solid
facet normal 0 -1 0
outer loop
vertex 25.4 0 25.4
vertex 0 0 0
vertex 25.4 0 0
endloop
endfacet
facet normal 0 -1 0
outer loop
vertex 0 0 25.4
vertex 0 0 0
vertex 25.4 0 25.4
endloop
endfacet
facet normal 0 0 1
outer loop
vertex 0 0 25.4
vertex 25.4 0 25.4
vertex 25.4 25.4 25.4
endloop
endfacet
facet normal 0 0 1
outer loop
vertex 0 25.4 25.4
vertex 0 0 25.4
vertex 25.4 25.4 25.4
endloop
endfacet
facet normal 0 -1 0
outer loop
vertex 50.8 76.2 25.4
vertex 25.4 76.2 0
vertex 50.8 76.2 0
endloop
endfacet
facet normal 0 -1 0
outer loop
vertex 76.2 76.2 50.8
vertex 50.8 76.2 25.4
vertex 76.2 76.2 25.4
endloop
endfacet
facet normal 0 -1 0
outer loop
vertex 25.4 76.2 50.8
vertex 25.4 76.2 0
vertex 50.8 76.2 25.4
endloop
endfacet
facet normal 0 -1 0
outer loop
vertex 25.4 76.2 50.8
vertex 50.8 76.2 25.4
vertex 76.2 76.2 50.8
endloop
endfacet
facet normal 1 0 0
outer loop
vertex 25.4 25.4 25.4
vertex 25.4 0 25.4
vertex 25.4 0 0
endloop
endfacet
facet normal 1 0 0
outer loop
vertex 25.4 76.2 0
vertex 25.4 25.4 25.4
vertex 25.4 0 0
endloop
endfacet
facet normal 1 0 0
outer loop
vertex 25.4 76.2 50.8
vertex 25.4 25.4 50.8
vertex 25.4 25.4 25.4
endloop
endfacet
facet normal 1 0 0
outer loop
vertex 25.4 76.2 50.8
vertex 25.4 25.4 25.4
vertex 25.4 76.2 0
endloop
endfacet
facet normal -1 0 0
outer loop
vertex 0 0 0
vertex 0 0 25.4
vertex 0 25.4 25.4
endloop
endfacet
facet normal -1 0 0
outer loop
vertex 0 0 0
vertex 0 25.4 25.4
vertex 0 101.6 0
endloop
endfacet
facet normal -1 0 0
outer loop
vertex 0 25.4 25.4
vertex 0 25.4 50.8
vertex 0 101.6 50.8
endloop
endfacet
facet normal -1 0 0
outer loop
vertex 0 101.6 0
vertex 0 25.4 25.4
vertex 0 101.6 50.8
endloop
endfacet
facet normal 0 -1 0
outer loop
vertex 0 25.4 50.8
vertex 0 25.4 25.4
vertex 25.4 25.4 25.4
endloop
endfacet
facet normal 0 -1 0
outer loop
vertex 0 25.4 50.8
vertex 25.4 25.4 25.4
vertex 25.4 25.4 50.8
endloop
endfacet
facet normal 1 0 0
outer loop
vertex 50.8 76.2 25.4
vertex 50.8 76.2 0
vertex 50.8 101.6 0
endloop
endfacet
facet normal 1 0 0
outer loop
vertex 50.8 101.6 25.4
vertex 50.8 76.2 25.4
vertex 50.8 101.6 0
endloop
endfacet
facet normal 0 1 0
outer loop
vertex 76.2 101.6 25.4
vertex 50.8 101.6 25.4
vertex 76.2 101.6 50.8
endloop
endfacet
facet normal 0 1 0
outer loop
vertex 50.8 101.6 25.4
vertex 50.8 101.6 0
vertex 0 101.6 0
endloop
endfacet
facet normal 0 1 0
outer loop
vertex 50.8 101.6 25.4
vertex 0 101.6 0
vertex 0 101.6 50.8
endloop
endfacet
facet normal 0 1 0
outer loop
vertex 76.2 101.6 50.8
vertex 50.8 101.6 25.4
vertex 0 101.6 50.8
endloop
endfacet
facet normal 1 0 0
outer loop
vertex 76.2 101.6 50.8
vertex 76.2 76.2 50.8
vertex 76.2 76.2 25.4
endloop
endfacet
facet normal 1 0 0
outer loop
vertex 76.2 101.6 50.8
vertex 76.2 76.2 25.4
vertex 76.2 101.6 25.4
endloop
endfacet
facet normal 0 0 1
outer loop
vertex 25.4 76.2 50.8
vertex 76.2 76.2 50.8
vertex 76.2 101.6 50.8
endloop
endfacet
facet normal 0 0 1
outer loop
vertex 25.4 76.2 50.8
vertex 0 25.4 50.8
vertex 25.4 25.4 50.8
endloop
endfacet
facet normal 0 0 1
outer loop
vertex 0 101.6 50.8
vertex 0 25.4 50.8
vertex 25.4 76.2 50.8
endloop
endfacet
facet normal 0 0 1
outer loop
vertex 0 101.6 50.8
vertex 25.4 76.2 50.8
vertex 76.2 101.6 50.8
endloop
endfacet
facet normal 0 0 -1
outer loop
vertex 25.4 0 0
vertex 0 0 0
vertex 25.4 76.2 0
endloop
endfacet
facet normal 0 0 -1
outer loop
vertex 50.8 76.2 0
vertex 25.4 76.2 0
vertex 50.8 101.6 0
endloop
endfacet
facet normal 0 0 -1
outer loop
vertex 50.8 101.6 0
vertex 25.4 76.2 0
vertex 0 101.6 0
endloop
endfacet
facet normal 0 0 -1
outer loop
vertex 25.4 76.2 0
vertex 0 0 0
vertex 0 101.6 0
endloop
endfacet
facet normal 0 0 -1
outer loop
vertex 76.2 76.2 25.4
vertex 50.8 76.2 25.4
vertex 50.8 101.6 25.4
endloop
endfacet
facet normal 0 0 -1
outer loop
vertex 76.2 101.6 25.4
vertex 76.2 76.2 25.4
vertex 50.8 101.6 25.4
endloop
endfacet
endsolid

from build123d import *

# Parameters (mm, degrees)
F0_W     = 101.6
F0_H     = 50.8
F1_DEPTH = 25.4
F2_W     = 25.4
F2_H     = 25.4
F3_DEPTH = 25.4
F4_W     = 25.4
F4_H     = 50.8
F5_DEPTH = 25.4
F6_W     = 25.4
F6_H     = 25.4
F7_DEPTH = 25.4


with BuildPart() as f1:
    # F0 (on Right) → F1 (new body)
    with BuildSketch(Plane.YZ):
        with Locations((50.8, 25.4)):
            Rectangle(F0_W, F0_H)
    extrude(amount=F1_DEPTH)

    # F2 (on face) → F3 (cut)
    with BuildSketch(Plane.YZ.offset(25.4)):
        with Locations((12.7, 38.1)):
            Rectangle(F2_W, F2_H)
    extrude(amount=-F3_DEPTH, mode=Mode.SUBTRACT)

    # F4 (on face) → F5 (join)
    with BuildSketch(Plane.YZ.offset(25.4)):
        with Locations((88.9, 25.4)):
            Rectangle(F4_W, F4_H)
    extrude(amount=F5_DEPTH)

    # F6 (on face) → F7 (join)
    with BuildSketch(Plane.YZ.offset(50.8)):
        with Locations((88.9, 38.1)):
            Rectangle(F6_W, F6_H)
    extrude(amount=F7_DEPTH)


solid = f1.part
